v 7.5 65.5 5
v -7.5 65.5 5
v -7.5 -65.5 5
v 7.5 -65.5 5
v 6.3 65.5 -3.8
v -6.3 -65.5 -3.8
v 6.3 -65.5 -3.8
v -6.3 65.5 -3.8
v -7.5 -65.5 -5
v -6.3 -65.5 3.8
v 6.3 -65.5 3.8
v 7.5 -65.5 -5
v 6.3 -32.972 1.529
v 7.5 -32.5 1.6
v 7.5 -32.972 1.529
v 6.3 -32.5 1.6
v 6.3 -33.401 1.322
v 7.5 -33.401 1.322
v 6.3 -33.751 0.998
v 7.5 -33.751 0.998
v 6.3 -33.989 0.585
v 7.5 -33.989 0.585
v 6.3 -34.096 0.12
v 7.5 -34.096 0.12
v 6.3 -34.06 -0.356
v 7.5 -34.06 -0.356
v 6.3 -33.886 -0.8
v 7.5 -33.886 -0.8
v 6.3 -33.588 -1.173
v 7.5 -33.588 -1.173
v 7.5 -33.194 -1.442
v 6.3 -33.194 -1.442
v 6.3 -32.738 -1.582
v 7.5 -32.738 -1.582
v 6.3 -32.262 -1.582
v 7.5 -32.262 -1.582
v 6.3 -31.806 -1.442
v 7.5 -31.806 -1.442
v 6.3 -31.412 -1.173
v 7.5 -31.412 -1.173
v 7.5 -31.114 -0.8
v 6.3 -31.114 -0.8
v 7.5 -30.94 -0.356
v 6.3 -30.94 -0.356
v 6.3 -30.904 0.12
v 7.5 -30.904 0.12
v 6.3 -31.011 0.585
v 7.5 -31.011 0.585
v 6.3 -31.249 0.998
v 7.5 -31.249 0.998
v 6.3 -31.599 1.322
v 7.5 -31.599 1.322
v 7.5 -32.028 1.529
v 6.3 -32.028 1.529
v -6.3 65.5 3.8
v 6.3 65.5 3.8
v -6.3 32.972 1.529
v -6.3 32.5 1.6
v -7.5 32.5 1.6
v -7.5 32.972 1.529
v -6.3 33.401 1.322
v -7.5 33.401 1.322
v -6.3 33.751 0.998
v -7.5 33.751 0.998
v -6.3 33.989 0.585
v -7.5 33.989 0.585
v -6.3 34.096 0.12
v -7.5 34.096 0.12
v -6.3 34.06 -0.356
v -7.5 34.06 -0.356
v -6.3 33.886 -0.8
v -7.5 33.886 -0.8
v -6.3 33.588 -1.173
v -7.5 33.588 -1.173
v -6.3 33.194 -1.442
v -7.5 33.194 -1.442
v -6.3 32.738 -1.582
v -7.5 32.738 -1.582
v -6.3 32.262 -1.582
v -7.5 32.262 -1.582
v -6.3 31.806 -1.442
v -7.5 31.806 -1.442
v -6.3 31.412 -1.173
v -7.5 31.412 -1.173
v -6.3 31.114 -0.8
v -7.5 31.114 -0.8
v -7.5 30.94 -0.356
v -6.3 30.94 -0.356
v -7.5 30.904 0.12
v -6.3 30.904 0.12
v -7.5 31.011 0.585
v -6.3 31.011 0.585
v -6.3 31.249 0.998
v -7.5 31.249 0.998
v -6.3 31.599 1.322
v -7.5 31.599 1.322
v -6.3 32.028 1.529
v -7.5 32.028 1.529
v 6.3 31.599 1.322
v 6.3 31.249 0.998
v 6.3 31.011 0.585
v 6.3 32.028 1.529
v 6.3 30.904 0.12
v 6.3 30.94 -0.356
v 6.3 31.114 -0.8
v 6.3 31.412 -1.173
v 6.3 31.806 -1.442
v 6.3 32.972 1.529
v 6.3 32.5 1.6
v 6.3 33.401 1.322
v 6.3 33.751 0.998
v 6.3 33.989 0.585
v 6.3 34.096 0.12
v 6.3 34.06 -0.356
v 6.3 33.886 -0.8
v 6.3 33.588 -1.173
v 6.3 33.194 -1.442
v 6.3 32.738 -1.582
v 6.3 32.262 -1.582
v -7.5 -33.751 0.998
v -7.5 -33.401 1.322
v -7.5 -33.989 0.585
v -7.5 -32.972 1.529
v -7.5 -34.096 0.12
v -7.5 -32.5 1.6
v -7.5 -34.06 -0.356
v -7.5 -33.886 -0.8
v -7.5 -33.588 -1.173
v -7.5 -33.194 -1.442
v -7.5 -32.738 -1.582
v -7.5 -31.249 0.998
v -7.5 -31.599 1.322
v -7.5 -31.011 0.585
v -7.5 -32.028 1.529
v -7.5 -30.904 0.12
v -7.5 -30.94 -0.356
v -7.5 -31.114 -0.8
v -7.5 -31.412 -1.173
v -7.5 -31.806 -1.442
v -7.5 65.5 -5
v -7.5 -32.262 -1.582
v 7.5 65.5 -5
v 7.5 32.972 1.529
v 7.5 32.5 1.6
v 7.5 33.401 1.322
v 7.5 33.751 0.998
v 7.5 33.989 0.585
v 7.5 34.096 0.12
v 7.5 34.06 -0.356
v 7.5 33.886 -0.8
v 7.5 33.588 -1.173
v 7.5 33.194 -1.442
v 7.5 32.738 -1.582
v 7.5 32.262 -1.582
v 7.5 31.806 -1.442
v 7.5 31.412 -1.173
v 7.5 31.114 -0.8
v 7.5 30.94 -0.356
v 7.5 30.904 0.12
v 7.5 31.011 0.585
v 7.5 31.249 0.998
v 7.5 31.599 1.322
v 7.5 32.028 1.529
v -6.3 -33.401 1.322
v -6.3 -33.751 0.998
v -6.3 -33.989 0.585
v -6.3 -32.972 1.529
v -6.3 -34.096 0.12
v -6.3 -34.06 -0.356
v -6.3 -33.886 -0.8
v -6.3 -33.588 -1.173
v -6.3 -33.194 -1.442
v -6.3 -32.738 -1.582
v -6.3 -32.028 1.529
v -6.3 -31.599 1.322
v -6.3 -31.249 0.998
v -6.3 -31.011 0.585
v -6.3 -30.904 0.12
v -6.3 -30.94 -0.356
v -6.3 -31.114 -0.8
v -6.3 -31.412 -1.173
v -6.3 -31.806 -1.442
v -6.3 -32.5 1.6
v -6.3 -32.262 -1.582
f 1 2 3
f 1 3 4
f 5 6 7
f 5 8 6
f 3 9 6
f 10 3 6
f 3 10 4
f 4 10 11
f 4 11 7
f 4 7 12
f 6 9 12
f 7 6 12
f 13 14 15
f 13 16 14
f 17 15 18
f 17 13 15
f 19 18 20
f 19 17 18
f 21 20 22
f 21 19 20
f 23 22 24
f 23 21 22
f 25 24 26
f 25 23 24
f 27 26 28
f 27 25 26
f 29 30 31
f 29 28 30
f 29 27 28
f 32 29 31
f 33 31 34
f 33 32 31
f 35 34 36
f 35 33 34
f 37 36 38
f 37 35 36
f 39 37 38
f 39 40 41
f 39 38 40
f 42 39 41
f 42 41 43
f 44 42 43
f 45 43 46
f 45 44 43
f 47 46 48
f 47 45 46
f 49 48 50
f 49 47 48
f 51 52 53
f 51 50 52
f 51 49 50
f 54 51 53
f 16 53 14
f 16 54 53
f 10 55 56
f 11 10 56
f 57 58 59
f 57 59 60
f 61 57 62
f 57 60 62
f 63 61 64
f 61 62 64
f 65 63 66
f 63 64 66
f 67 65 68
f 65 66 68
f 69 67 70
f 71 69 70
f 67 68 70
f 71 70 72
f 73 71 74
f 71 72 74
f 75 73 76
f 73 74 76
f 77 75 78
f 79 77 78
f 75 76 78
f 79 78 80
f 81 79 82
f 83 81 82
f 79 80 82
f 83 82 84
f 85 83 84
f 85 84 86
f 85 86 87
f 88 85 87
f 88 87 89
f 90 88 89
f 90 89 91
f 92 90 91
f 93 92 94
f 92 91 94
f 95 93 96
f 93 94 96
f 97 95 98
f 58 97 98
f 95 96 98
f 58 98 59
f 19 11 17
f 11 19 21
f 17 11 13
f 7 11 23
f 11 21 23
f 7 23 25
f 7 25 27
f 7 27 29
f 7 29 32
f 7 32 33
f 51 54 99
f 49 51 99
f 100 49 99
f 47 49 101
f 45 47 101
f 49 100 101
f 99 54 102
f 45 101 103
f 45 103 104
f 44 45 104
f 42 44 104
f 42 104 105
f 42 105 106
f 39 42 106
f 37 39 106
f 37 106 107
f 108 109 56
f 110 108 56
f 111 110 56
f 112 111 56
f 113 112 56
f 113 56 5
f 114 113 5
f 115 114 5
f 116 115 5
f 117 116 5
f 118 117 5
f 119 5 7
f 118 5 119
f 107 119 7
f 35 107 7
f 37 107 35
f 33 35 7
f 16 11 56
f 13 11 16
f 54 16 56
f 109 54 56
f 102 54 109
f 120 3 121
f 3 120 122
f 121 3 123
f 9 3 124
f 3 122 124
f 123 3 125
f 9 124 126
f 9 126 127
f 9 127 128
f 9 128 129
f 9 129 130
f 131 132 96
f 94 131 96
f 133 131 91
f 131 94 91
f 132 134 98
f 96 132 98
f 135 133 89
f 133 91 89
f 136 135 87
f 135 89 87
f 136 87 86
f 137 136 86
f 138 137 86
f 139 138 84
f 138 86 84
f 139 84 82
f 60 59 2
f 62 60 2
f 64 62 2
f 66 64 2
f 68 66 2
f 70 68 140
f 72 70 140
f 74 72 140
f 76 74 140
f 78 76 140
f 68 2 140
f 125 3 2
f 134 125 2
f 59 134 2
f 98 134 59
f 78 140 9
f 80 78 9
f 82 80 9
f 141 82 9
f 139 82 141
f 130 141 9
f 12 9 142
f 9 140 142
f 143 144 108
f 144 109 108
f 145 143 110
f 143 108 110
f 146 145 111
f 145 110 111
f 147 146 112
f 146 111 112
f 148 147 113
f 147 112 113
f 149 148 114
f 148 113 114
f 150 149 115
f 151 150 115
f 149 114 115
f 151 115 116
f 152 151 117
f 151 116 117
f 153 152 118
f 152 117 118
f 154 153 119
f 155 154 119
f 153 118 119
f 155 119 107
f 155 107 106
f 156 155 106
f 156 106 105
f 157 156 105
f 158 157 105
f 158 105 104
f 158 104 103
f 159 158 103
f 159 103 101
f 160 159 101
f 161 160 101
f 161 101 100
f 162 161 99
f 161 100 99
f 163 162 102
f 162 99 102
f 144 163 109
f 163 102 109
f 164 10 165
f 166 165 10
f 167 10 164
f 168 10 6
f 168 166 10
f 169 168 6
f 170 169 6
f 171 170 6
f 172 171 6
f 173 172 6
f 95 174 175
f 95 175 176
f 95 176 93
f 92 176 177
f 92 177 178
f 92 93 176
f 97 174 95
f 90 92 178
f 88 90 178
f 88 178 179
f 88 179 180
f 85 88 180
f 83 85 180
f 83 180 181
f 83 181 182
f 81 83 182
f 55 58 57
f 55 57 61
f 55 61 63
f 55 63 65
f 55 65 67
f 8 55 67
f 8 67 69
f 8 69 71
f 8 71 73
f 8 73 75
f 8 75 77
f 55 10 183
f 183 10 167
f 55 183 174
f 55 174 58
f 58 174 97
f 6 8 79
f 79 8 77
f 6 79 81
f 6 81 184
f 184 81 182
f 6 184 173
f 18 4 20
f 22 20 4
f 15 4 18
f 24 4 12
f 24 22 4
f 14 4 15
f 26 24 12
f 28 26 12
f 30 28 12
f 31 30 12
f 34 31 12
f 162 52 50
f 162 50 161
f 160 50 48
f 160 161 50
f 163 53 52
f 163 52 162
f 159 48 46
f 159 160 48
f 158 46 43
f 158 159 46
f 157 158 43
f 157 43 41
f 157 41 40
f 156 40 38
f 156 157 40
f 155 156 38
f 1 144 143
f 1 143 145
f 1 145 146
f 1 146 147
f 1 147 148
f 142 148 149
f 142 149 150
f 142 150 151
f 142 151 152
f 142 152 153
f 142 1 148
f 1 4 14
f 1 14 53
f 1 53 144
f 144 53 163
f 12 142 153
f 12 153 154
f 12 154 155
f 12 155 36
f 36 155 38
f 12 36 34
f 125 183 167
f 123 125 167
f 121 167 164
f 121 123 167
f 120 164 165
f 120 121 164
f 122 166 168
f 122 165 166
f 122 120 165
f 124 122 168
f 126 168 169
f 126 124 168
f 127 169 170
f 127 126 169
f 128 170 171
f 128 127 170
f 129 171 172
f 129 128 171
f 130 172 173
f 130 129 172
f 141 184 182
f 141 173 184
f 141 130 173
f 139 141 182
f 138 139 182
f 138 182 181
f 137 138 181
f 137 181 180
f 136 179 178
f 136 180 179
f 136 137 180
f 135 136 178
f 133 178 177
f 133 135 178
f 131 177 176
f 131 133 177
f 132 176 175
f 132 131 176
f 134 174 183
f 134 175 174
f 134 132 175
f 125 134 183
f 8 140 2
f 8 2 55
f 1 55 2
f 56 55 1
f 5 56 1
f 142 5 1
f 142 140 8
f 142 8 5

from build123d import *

# Parameters (mm, degrees)
SKETCH_1_W          = 15
SKETCH_1_H          = 10
SKETCH_1_W_2        = 12.6
SKETCH_1_H_2        = 7.6
EXTRUDE_1_DEPTH     = 65.5
SKETCH_2_R          = 1.6
CUT_EXTRUDE_1_DEPTH = 65.5


with BuildPart() as part:
    # ｽｹｯﾁ1 → ﾎﾞｽ - 押し出し1 (new, symmetric)
    with BuildSketch(Plane(origin=(0, 0, 0), x_dir=(1, 0, 0), z_dir=(0, 1, 0))):
        Rectangle(SKETCH_1_W, SKETCH_1_H)
        Rectangle(SKETCH_1_W_2, SKETCH_1_H_2, mode=Mode.SUBTRACT)
    extrude(amount=EXTRUDE_1_DEPTH, both=True)

    # ｽｹｯﾁ2 → ｶｯﾄ - 押し出し1 (cut, symmetric)
    with BuildSketch(Plane.ZY.offset(7.5)):
        with Locations((0, 32.5)):
            Circle(SKETCH_2_R)
    cut_extrude_1 = extrude(amount=CUT_EXTRUDE_1_DEPTH, both=True, mode=Mode.SUBTRACT)

    # ﾐﾗｰ1: ｶｯﾄ - 押し出し1 across plane
    add(cut_extrude_1.mirror(Plane.ZX), mode=Mode.SUBTRACT)


solid = part.part
